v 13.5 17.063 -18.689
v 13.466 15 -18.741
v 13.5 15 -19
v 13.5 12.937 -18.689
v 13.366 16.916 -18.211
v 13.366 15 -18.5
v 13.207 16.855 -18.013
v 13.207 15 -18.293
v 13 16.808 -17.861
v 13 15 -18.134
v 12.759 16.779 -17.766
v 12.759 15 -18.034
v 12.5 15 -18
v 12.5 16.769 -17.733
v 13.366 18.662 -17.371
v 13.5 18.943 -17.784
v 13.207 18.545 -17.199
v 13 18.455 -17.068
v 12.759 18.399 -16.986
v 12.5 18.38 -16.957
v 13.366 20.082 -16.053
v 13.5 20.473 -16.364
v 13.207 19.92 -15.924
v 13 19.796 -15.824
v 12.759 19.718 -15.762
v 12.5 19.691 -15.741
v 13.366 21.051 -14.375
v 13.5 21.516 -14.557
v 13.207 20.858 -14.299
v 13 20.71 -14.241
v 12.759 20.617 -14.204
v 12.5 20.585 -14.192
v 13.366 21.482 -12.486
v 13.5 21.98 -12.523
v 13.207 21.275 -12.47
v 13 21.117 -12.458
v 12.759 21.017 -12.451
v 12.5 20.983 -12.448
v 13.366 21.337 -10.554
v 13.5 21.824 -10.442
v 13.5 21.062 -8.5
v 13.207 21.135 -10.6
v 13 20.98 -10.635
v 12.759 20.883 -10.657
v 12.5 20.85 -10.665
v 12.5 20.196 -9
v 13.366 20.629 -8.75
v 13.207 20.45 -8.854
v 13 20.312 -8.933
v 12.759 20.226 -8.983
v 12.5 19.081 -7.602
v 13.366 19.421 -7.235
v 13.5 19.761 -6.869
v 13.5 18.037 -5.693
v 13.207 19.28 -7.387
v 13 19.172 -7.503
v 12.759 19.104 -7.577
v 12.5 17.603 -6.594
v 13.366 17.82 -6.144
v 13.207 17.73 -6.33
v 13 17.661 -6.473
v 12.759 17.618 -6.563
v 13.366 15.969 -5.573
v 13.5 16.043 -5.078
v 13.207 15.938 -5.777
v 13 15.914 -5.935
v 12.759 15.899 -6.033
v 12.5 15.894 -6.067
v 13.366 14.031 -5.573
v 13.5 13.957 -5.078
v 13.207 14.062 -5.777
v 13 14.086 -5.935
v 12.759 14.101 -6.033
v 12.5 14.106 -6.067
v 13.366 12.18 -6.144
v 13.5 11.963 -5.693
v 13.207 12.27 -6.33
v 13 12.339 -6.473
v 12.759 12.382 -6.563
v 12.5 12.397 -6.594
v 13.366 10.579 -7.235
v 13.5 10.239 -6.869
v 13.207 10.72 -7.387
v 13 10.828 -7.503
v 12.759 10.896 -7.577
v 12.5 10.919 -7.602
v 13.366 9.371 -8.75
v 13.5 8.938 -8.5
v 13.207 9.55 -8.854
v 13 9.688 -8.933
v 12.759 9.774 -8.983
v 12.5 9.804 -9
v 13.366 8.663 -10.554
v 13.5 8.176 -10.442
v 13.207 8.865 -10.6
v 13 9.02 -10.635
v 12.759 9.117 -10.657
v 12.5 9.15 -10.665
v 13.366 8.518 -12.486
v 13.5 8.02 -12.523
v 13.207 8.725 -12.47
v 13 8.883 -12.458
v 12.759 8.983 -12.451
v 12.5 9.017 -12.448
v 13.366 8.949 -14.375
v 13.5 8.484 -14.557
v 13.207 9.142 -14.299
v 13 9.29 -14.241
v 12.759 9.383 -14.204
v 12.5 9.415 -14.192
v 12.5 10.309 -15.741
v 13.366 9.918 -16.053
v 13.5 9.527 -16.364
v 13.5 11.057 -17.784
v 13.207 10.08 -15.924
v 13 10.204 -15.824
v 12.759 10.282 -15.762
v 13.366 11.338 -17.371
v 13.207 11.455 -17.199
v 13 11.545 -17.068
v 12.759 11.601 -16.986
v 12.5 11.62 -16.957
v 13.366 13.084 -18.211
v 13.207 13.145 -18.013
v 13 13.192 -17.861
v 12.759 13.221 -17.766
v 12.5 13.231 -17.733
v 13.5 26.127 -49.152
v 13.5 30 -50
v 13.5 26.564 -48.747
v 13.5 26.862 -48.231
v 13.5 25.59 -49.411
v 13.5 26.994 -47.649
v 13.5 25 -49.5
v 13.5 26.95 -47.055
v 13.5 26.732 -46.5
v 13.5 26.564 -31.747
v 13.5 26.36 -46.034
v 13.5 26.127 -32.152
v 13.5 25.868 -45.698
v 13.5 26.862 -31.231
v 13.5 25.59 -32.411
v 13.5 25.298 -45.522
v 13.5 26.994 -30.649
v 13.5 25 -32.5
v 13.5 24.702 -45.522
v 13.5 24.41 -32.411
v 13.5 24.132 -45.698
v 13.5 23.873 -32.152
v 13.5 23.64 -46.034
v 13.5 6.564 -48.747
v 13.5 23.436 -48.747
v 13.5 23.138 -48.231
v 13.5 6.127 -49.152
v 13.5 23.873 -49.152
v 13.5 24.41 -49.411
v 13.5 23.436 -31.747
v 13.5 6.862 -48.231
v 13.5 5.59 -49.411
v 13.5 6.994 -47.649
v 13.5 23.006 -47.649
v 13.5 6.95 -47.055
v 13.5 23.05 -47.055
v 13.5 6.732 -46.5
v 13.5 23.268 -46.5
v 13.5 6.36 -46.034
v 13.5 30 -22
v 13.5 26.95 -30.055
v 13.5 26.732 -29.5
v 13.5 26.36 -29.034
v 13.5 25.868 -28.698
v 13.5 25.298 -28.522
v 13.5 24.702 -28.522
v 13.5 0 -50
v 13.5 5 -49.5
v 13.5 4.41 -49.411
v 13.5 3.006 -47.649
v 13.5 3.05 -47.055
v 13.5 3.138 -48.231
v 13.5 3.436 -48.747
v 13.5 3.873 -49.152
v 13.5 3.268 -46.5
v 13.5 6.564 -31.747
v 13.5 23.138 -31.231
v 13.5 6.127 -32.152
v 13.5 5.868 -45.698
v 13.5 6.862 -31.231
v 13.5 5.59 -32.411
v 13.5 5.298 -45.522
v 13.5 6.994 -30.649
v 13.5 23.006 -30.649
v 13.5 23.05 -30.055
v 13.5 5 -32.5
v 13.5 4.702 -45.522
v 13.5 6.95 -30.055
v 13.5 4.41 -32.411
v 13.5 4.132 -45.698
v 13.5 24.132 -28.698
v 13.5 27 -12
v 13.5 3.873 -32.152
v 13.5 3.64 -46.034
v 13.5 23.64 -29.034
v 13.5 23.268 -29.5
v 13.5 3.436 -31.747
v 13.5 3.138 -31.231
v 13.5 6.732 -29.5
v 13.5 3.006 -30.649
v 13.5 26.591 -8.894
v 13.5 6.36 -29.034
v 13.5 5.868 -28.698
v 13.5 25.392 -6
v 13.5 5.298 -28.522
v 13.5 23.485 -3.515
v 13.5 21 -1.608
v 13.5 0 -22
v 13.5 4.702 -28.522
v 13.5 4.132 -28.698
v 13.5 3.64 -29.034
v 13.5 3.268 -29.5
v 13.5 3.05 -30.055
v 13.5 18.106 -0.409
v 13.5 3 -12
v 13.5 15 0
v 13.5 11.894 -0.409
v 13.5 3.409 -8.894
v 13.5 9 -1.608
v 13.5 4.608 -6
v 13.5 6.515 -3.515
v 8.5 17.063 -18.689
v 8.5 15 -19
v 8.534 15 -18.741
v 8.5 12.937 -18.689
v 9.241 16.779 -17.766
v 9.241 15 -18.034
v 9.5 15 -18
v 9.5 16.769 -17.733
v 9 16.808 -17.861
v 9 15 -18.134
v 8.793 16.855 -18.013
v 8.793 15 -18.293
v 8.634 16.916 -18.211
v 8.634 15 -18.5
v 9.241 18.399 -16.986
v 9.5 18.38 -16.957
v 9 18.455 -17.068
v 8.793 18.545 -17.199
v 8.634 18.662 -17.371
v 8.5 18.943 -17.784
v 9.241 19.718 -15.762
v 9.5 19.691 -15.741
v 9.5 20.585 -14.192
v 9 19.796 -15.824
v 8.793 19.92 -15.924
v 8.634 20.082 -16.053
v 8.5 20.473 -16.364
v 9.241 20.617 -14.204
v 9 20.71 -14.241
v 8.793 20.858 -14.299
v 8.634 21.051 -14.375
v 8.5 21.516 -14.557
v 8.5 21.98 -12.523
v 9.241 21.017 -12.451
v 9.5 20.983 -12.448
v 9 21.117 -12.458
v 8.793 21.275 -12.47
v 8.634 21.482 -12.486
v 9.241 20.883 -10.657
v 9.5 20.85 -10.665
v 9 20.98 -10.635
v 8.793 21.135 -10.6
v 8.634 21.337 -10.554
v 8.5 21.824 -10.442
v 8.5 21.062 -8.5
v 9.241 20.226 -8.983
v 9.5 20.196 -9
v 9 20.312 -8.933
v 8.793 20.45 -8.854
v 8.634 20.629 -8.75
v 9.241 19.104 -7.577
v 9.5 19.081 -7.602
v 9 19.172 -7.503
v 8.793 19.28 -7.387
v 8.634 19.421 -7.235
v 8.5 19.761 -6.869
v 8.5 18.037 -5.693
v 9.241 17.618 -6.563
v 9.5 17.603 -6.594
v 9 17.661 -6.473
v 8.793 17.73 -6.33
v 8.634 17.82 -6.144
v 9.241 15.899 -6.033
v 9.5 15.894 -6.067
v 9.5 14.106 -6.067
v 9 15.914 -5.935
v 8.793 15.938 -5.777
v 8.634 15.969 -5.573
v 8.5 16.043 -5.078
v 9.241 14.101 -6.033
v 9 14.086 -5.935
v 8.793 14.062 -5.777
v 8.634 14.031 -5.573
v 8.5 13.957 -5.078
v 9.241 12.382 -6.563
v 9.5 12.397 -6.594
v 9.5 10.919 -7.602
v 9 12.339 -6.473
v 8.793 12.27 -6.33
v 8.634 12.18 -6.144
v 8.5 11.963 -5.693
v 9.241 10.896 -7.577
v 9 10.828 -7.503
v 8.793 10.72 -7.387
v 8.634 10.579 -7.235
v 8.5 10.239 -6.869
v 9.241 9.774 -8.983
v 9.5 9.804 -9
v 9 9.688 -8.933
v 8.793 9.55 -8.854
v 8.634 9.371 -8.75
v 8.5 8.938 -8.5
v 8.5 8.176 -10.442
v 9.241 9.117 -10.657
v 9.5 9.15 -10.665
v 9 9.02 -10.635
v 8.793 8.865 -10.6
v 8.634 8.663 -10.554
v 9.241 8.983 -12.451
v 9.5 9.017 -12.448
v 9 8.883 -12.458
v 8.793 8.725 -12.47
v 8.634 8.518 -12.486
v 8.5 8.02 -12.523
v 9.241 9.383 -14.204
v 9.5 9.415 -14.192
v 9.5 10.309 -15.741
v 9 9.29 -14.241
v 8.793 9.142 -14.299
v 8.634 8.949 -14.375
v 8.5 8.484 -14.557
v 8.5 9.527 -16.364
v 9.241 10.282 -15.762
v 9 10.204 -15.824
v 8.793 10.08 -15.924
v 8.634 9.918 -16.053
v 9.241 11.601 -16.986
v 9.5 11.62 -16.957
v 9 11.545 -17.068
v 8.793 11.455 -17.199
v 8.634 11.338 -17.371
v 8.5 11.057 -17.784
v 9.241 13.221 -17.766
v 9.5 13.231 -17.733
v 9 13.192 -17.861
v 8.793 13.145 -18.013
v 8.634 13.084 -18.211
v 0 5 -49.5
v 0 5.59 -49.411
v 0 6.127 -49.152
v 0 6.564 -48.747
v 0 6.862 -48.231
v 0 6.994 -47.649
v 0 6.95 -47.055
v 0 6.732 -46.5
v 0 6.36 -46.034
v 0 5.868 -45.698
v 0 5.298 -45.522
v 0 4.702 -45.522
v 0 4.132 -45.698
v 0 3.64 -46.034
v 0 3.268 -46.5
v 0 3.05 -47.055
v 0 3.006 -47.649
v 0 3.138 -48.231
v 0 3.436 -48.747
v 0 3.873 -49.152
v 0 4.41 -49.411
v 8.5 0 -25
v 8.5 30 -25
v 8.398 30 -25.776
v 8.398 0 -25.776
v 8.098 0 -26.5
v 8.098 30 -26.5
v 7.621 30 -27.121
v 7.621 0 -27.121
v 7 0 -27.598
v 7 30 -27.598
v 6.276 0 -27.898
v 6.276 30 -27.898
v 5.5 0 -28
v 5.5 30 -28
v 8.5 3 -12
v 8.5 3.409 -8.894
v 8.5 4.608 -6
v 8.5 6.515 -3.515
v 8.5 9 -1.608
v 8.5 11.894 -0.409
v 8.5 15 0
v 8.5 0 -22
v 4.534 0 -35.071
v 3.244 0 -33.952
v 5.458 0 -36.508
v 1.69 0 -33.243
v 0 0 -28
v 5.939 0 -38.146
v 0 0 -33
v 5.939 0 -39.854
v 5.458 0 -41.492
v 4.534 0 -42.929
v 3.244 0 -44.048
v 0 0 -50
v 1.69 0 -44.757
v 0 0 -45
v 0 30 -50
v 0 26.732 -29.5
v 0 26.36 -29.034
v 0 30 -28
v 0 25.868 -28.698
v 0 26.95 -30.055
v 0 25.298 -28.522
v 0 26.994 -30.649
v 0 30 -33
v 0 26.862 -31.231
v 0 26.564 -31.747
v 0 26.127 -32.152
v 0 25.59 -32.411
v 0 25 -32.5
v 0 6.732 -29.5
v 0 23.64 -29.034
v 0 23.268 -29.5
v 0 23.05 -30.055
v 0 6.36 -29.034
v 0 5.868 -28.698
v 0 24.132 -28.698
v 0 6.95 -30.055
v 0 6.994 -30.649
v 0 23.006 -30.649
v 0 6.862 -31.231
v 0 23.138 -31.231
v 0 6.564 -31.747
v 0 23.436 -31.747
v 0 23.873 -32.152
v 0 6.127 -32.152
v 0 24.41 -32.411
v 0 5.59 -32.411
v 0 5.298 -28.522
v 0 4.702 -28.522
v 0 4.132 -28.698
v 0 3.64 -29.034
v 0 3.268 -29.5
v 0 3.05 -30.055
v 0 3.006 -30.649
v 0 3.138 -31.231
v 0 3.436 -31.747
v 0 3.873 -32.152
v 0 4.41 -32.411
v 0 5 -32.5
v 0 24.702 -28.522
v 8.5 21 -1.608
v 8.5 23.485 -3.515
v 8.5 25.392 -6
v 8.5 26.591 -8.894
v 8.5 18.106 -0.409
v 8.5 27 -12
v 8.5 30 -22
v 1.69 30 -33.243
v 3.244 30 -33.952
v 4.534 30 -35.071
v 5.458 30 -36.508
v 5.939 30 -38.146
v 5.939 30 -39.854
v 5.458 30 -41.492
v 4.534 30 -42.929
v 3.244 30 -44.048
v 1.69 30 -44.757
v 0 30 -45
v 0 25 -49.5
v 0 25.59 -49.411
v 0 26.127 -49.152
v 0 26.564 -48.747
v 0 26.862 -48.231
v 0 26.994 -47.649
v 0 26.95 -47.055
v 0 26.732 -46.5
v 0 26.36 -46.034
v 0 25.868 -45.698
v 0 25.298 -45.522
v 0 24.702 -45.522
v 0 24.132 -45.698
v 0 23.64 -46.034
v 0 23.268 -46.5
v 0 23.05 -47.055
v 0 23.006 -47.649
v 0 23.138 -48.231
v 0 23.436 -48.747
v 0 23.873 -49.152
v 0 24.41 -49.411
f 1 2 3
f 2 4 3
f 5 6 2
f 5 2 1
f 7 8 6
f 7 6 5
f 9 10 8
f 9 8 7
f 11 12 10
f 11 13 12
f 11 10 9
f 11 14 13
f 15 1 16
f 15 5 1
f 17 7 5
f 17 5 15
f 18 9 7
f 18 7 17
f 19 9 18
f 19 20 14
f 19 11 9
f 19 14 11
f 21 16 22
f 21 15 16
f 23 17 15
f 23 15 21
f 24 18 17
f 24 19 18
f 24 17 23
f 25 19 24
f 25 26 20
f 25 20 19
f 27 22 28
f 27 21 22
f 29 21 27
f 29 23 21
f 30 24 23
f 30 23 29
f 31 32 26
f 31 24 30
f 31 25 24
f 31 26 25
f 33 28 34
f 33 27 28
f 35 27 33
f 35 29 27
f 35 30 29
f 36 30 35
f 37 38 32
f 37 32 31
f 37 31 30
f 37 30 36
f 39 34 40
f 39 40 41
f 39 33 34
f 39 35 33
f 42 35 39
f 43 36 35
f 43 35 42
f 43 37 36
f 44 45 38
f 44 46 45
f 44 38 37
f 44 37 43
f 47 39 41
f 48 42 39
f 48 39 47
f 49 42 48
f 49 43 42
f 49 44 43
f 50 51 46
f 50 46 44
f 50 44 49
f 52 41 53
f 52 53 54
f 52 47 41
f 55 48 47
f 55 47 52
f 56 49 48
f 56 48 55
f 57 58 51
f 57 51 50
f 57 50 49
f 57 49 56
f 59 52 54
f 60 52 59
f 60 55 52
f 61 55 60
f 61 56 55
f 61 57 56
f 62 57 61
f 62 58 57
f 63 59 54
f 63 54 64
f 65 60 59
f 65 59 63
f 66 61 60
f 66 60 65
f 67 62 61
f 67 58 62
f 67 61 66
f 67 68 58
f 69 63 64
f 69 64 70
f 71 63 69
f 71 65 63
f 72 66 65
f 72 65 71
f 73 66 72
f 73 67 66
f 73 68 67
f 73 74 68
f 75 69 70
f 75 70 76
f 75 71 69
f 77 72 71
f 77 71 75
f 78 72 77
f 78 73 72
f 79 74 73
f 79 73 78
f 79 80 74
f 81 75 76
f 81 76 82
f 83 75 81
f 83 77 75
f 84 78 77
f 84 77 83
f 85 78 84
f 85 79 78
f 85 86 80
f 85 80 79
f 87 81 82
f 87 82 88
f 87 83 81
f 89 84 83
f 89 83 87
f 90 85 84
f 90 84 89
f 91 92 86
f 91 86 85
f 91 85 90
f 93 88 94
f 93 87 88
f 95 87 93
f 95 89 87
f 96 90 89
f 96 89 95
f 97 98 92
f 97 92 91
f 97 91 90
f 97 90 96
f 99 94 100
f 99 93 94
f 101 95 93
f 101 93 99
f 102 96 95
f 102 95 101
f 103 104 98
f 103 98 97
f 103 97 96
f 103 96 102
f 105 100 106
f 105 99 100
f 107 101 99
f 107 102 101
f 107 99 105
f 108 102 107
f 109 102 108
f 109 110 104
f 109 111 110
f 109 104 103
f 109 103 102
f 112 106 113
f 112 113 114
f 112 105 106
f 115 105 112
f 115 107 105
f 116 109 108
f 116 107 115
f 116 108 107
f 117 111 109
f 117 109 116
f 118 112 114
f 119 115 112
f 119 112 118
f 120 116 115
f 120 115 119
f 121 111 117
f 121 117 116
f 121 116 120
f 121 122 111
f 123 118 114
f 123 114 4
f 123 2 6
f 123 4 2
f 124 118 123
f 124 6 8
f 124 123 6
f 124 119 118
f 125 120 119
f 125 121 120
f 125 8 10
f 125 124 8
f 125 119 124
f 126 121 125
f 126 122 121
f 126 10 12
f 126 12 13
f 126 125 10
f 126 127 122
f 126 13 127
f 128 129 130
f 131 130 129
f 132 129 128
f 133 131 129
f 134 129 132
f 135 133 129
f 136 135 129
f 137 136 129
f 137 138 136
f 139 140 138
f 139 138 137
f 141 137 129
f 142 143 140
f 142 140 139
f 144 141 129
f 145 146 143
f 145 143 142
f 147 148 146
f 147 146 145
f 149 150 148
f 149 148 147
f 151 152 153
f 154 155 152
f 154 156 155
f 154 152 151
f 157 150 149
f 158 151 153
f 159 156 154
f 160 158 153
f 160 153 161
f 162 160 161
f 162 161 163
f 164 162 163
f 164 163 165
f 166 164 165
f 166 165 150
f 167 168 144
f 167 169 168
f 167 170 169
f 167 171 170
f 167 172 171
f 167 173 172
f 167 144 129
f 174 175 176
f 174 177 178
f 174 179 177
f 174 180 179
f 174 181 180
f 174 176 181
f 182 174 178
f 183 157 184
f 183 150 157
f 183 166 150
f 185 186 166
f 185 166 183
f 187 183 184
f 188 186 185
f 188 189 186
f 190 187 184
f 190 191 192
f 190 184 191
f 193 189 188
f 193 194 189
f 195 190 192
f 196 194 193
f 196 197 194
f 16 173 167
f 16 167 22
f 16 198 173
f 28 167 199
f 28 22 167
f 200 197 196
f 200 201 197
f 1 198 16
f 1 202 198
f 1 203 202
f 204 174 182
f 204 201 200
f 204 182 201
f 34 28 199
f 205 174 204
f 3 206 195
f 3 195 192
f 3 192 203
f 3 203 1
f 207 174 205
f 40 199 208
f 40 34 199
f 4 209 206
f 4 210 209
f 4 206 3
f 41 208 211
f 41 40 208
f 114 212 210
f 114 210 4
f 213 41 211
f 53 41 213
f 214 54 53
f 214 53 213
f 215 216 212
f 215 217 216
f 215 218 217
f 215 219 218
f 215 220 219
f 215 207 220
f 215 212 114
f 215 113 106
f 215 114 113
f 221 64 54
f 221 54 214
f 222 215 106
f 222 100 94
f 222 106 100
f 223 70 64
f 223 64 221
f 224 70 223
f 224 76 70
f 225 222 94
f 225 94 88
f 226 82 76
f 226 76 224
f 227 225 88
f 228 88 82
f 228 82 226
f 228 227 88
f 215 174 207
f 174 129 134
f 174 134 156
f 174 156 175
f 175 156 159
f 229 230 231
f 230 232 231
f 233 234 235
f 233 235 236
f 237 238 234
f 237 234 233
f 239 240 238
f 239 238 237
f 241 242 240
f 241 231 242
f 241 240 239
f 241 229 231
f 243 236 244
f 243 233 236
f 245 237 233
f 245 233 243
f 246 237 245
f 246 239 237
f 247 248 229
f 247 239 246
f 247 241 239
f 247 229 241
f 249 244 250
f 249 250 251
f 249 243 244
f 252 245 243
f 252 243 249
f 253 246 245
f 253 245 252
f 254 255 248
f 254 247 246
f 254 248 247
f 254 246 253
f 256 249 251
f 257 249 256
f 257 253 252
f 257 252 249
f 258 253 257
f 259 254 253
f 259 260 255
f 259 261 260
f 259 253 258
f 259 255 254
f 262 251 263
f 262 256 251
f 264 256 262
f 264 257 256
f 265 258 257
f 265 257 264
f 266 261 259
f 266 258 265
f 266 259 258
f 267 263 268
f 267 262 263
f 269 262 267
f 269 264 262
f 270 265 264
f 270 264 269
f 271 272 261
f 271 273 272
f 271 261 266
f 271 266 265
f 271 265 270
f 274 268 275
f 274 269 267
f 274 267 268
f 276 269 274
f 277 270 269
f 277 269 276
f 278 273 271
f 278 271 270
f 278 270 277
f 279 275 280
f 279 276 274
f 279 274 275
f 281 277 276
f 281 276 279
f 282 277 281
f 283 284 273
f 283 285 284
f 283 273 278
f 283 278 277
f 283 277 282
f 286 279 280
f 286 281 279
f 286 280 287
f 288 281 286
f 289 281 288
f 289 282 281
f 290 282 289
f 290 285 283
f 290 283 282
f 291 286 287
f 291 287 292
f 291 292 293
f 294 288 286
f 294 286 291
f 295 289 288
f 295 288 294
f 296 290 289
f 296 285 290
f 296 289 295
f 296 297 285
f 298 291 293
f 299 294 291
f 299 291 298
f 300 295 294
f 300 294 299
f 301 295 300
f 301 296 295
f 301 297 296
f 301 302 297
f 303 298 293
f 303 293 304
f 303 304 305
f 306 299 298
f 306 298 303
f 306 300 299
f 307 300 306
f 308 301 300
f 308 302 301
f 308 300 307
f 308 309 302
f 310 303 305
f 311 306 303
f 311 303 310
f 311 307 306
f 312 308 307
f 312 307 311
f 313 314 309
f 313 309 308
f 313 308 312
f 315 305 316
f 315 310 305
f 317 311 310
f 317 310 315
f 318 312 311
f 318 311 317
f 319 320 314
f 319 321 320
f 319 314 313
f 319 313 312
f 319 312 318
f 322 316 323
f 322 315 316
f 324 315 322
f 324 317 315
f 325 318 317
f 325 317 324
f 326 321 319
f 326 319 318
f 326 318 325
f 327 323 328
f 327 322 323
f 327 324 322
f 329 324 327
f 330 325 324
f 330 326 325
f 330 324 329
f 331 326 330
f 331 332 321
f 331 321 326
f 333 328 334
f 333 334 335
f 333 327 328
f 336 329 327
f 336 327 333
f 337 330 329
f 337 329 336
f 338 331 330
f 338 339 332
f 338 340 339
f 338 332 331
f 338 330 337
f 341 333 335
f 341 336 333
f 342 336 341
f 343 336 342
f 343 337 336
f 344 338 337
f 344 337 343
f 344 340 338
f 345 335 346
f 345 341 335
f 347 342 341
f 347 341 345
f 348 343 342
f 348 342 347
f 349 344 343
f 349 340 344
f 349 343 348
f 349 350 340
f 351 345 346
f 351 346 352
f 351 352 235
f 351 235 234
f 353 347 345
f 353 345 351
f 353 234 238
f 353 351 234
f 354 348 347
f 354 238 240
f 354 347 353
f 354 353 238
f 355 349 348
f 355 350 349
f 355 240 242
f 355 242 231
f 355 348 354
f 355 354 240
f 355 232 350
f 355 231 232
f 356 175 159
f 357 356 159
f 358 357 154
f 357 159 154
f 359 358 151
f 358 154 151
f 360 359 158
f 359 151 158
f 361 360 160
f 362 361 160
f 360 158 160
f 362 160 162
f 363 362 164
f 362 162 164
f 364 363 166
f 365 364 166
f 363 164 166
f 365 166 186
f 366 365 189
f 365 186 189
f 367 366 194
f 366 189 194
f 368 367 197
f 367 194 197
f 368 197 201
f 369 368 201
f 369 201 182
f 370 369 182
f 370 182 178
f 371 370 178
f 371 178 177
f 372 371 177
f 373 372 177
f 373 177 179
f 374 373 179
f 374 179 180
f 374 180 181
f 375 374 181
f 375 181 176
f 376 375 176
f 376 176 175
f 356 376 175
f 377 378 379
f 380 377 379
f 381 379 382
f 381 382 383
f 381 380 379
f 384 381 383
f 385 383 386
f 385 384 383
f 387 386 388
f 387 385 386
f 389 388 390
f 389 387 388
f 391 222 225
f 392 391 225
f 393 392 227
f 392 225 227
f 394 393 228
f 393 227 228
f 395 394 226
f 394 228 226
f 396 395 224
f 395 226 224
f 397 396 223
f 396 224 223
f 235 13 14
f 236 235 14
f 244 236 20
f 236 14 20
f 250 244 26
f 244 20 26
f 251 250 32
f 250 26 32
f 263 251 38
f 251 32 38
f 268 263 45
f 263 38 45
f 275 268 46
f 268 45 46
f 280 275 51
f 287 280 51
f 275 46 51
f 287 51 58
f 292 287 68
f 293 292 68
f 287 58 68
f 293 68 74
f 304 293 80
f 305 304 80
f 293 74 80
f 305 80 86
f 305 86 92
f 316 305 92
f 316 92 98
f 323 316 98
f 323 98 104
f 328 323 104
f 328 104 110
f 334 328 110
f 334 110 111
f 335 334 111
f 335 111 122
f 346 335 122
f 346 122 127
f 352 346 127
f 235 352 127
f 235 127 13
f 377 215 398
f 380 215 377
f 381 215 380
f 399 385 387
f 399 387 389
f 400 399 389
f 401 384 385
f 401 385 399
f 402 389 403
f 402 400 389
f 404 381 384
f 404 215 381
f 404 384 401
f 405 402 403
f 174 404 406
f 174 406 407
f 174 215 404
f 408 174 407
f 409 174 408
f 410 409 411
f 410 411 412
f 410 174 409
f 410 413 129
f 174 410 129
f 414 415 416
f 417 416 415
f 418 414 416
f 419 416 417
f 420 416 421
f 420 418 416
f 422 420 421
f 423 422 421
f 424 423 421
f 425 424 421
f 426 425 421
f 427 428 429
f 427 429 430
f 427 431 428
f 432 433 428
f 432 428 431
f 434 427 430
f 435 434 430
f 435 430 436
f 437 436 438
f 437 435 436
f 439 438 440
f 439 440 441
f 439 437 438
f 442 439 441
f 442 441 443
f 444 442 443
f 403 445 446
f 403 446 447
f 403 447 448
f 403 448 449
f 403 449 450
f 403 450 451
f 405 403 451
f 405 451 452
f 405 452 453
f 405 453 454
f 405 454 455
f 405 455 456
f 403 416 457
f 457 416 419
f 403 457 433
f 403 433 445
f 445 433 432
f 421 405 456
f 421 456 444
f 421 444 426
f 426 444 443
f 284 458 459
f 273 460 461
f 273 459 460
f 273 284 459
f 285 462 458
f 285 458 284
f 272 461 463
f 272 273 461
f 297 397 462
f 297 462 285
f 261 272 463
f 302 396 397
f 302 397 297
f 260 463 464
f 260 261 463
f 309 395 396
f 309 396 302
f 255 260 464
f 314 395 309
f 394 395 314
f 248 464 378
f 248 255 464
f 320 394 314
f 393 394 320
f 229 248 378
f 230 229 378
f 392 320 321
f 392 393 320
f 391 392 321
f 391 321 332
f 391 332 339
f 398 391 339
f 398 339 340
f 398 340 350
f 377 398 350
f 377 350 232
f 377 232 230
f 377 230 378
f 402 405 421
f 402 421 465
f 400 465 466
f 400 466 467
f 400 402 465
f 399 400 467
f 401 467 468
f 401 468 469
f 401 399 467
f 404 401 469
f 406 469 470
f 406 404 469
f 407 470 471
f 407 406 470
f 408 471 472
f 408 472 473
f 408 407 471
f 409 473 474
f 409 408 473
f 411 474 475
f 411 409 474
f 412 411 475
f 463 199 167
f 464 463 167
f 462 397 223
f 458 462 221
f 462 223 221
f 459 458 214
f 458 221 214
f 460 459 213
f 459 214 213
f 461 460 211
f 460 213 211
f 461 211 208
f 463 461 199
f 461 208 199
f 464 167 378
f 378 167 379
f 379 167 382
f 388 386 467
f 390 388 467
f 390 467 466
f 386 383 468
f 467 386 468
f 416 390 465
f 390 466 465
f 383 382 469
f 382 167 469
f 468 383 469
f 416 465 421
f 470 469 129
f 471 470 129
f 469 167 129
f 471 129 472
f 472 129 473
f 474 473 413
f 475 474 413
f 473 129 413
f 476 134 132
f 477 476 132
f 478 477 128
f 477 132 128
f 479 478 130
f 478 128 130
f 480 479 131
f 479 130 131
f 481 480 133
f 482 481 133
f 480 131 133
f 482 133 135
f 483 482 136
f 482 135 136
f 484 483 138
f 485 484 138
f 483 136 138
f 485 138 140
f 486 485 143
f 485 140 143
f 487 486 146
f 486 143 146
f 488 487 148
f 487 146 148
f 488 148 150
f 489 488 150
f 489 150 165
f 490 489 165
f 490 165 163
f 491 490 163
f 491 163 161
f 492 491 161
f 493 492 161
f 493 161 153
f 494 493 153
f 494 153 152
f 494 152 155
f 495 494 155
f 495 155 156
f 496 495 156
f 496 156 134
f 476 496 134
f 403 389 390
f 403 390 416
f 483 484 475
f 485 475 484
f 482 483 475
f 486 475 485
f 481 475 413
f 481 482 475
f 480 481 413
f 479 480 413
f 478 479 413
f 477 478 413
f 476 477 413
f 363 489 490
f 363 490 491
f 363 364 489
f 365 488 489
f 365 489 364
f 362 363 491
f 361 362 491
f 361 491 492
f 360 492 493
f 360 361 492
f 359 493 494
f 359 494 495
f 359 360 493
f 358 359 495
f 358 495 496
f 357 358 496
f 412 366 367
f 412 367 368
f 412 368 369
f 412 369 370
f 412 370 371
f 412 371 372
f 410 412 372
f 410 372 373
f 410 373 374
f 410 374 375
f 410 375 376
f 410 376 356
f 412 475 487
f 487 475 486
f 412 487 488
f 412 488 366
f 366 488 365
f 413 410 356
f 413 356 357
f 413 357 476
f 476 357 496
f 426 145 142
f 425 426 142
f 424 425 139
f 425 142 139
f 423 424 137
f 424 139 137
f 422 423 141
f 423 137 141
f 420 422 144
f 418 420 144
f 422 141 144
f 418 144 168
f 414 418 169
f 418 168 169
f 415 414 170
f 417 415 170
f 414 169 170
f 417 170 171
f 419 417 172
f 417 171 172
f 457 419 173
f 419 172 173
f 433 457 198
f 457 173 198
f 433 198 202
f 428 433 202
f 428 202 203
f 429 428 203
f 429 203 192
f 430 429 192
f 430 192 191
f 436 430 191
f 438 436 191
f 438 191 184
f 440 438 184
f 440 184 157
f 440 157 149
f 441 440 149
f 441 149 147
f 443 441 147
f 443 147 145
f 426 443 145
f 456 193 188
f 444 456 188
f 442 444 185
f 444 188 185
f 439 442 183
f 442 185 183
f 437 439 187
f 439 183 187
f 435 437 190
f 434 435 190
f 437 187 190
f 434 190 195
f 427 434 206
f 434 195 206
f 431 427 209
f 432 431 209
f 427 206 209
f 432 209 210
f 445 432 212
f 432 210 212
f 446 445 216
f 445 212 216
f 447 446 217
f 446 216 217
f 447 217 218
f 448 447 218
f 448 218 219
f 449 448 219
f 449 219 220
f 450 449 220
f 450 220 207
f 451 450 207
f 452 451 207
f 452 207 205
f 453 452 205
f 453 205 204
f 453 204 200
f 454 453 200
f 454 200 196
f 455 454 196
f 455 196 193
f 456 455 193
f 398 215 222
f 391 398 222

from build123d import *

# Parameters (mm, degrees)
BOSS_EXTRUDE1_DEPTH = 30
CUT_EXTRUDE2_REACH  = 61.852
SKETCH3_R           = 2
SKETCH3_R_2         = 6
FILLET1_R           = 1


with BuildPart() as part:
    # Sketch2 → Boss-Extrude1 (new body)
    with BuildSketch(Plane(origin=(0, 0, 0), x_dir=(1, 0, 0), z_dir=(0, 1, 0))):
        with BuildLine():
            Line((0, 50), (13.5, 50))
            Line((13.5, 50), (13.5, 0))
            Line((13.5, 0), (8.5, 0))
            Line((8.5, 0), (8.5, 25))
            ThreePointArc((8.5, 25), (7.621320344, 27.121320344), (5.5, 28))
            Line((5.5, 28), (0, 28))
            Line((0, 28), (0, 33))
            ThreePointArc((0, 33), (6, 39), (0, 45))
            Line((0, 45), (0, 50))
        make_face()
    extrude(amount=BOSS_EXTRUDE1_DEPTH)

    # Sketch3 → Cut-Extrude2 (cut, up to next)
    with BuildSketch(Plane(origin=(13.5, 0, 0), x_dir=(0, 0, -1), z_dir=(1, 0, 0)), mode=Mode.PRIVATE) as cut_extrude2_sk1:
        with BuildLine():
            ThreePointArc((0, 15), (3.514718626, 23.485281374), (12, 27))
            Line((12, 27), (22, 30))
            Line((22, 30), (0, 30))
            Line((0, 30), (0, 15))
        make_face()
    cut_extrude2_tool1 = extrude(cut_extrude2_sk1.sketch, amount=-CUT_EXTRUDE2_REACH, mode=Mode.PRIVATE) & part.part
    # Sketch3 → Cut-Extrude2 (cut, up to next)
    with BuildSketch(Plane(origin=(13.5, 0, 0), x_dir=(0, 0, -1), z_dir=(1, 0, 0)), mode=Mode.PRIVATE) as cut_extrude2_sk2:
        with BuildLine():
            ThreePointArc((12, 3), (3.514718626, 6.514718626), (0, 15))
            Line((0, 15), (0, 0))
            Line((0, 0), (22, 0))
            Line((22, 0), (12, 3))
        make_face()
    cut_extrude2_tool2 = extrude(cut_extrude2_sk2.sketch, amount=-CUT_EXTRUDE2_REACH, mode=Mode.PRIVATE) & part.part
    # Sketch3 → Cut-Extrude2 (cut, up to next)
    with BuildSketch(Plane(origin=(13.5, 0, 0), x_dir=(0, 0, -1), z_dir=(1, 0, 0)), mode=Mode.PRIVATE) as cut_extrude2_sk3:
        with Locations((30.5, 5)):
            Circle(SKETCH3_R)
    cut_extrude2_tool3 = extrude(cut_extrude2_sk3.sketch, amount=-CUT_EXTRUDE2_REACH, mode=Mode.PRIVATE) & part.part
    # Sketch3 → Cut-Extrude2 (cut, up to next)
    with BuildSketch(Plane(origin=(13.5, 0, 0), x_dir=(0, 0, -1), z_dir=(1, 0, 0)), mode=Mode.PRIVATE) as cut_extrude2_sk4:
        with Locations((47.5, 5)):
            Circle(SKETCH3_R)
    cut_extrude2_tool4 = extrude(cut_extrude2_sk4.sketch, amount=-CUT_EXTRUDE2_REACH, mode=Mode.PRIVATE) & part.part
    # Sketch3 → Cut-Extrude2 (cut, up to next)
    with BuildSketch(Plane(origin=(13.5, 0, 0), x_dir=(0, 0, -1), z_dir=(1, 0, 0)), mode=Mode.PRIVATE) as cut_extrude2_sk5:
        with Locations((47.5, 5)):
            Circle(SKETCH3_R)
    cut_extrude2_tool5 = extrude(cut_extrude2_sk5.sketch, amount=-CUT_EXTRUDE2_REACH, mode=Mode.PRIVATE) & part.part
    # Sketch3 → Cut-Extrude2 (cut, up to next)
    with BuildSketch(Plane(origin=(13.5, 0, 0), x_dir=(0, 0, -1), z_dir=(1, 0, 0)), mode=Mode.PRIVATE) as cut_extrude2_sk6:
        with Locations((12, 15)):
            Circle(SKETCH3_R_2)
    cut_extrude2_tool6 = extrude(cut_extrude2_sk6.sketch, amount=-CUT_EXTRUDE2_REACH, mode=Mode.PRIVATE) & part.part
    # Sketch3 → Cut-Extrude2 (cut, up to next)
    with BuildSketch(Plane(origin=(13.5, 0, 0), x_dir=(0, 0, -1), z_dir=(1, 0, 0)), mode=Mode.PRIVATE) as cut_extrude2_sk7:
        with Locations((30.5, 25)):
            Circle(SKETCH3_R)
    cut_extrude2_tool7 = extrude(cut_extrude2_sk7.sketch, amount=-CUT_EXTRUDE2_REACH, mode=Mode.PRIVATE) & part.part
    # Sketch3 → Cut-Extrude2 (cut, up to next)
    with BuildSketch(Plane(origin=(13.5, 0, 0), x_dir=(0, 0, -1), z_dir=(1, 0, 0)), mode=Mode.PRIVATE) as cut_extrude2_sk8:
        with Locations((47.5, 25)):
            Circle(SKETCH3_R)
    cut_extrude2_tool8 = extrude(cut_extrude2_sk8.sketch, amount=-CUT_EXTRUDE2_REACH, mode=Mode.PRIVATE) & part.part
    add(cut_extrude2_tool1.solids().sort_by_distance((13.5, 27.014261, -6.456835))[0], mode=Mode.SUBTRACT)
    add(cut_extrude2_tool2.solids().sort_by_distance((13.5, 2.985739, -6.456835))[0], mode=Mode.SUBTRACT)
    add(cut_extrude2_tool3.solids().sort_by_distance((13.5, 5, -30.5))[0], mode=Mode.SUBTRACT)
    add(cut_extrude2_tool4.solids().sort_by_distance((13.5, 5, -47.5))[0], mode=Mode.SUBTRACT)
    add(cut_extrude2_tool5.solids().sort_by_distance((13.5, 5, -47.5))[0], mode=Mode.SUBTRACT)
    add(cut_extrude2_tool6.solids().sort_by_distance((13.5, 15, -12))[0], mode=Mode.SUBTRACT)
    add(cut_extrude2_tool7.solids().sort_by_distance((13.5, 25, -30.5))[0], mode=Mode.SUBTRACT)
    add(cut_extrude2_tool8.solids().sort_by_distance((13.5, 25, -47.5))[0], mode=Mode.SUBTRACT)

    # Fillet1
    fillet1_edges = [part.edges().sort_by_distance(p)[0] for p in [
        (13.5, 15, -6),
        (8.5, 15, -6),
    ]]
    fillet(fillet1_edges, radius=FILLET1_R)


solid = part.part
